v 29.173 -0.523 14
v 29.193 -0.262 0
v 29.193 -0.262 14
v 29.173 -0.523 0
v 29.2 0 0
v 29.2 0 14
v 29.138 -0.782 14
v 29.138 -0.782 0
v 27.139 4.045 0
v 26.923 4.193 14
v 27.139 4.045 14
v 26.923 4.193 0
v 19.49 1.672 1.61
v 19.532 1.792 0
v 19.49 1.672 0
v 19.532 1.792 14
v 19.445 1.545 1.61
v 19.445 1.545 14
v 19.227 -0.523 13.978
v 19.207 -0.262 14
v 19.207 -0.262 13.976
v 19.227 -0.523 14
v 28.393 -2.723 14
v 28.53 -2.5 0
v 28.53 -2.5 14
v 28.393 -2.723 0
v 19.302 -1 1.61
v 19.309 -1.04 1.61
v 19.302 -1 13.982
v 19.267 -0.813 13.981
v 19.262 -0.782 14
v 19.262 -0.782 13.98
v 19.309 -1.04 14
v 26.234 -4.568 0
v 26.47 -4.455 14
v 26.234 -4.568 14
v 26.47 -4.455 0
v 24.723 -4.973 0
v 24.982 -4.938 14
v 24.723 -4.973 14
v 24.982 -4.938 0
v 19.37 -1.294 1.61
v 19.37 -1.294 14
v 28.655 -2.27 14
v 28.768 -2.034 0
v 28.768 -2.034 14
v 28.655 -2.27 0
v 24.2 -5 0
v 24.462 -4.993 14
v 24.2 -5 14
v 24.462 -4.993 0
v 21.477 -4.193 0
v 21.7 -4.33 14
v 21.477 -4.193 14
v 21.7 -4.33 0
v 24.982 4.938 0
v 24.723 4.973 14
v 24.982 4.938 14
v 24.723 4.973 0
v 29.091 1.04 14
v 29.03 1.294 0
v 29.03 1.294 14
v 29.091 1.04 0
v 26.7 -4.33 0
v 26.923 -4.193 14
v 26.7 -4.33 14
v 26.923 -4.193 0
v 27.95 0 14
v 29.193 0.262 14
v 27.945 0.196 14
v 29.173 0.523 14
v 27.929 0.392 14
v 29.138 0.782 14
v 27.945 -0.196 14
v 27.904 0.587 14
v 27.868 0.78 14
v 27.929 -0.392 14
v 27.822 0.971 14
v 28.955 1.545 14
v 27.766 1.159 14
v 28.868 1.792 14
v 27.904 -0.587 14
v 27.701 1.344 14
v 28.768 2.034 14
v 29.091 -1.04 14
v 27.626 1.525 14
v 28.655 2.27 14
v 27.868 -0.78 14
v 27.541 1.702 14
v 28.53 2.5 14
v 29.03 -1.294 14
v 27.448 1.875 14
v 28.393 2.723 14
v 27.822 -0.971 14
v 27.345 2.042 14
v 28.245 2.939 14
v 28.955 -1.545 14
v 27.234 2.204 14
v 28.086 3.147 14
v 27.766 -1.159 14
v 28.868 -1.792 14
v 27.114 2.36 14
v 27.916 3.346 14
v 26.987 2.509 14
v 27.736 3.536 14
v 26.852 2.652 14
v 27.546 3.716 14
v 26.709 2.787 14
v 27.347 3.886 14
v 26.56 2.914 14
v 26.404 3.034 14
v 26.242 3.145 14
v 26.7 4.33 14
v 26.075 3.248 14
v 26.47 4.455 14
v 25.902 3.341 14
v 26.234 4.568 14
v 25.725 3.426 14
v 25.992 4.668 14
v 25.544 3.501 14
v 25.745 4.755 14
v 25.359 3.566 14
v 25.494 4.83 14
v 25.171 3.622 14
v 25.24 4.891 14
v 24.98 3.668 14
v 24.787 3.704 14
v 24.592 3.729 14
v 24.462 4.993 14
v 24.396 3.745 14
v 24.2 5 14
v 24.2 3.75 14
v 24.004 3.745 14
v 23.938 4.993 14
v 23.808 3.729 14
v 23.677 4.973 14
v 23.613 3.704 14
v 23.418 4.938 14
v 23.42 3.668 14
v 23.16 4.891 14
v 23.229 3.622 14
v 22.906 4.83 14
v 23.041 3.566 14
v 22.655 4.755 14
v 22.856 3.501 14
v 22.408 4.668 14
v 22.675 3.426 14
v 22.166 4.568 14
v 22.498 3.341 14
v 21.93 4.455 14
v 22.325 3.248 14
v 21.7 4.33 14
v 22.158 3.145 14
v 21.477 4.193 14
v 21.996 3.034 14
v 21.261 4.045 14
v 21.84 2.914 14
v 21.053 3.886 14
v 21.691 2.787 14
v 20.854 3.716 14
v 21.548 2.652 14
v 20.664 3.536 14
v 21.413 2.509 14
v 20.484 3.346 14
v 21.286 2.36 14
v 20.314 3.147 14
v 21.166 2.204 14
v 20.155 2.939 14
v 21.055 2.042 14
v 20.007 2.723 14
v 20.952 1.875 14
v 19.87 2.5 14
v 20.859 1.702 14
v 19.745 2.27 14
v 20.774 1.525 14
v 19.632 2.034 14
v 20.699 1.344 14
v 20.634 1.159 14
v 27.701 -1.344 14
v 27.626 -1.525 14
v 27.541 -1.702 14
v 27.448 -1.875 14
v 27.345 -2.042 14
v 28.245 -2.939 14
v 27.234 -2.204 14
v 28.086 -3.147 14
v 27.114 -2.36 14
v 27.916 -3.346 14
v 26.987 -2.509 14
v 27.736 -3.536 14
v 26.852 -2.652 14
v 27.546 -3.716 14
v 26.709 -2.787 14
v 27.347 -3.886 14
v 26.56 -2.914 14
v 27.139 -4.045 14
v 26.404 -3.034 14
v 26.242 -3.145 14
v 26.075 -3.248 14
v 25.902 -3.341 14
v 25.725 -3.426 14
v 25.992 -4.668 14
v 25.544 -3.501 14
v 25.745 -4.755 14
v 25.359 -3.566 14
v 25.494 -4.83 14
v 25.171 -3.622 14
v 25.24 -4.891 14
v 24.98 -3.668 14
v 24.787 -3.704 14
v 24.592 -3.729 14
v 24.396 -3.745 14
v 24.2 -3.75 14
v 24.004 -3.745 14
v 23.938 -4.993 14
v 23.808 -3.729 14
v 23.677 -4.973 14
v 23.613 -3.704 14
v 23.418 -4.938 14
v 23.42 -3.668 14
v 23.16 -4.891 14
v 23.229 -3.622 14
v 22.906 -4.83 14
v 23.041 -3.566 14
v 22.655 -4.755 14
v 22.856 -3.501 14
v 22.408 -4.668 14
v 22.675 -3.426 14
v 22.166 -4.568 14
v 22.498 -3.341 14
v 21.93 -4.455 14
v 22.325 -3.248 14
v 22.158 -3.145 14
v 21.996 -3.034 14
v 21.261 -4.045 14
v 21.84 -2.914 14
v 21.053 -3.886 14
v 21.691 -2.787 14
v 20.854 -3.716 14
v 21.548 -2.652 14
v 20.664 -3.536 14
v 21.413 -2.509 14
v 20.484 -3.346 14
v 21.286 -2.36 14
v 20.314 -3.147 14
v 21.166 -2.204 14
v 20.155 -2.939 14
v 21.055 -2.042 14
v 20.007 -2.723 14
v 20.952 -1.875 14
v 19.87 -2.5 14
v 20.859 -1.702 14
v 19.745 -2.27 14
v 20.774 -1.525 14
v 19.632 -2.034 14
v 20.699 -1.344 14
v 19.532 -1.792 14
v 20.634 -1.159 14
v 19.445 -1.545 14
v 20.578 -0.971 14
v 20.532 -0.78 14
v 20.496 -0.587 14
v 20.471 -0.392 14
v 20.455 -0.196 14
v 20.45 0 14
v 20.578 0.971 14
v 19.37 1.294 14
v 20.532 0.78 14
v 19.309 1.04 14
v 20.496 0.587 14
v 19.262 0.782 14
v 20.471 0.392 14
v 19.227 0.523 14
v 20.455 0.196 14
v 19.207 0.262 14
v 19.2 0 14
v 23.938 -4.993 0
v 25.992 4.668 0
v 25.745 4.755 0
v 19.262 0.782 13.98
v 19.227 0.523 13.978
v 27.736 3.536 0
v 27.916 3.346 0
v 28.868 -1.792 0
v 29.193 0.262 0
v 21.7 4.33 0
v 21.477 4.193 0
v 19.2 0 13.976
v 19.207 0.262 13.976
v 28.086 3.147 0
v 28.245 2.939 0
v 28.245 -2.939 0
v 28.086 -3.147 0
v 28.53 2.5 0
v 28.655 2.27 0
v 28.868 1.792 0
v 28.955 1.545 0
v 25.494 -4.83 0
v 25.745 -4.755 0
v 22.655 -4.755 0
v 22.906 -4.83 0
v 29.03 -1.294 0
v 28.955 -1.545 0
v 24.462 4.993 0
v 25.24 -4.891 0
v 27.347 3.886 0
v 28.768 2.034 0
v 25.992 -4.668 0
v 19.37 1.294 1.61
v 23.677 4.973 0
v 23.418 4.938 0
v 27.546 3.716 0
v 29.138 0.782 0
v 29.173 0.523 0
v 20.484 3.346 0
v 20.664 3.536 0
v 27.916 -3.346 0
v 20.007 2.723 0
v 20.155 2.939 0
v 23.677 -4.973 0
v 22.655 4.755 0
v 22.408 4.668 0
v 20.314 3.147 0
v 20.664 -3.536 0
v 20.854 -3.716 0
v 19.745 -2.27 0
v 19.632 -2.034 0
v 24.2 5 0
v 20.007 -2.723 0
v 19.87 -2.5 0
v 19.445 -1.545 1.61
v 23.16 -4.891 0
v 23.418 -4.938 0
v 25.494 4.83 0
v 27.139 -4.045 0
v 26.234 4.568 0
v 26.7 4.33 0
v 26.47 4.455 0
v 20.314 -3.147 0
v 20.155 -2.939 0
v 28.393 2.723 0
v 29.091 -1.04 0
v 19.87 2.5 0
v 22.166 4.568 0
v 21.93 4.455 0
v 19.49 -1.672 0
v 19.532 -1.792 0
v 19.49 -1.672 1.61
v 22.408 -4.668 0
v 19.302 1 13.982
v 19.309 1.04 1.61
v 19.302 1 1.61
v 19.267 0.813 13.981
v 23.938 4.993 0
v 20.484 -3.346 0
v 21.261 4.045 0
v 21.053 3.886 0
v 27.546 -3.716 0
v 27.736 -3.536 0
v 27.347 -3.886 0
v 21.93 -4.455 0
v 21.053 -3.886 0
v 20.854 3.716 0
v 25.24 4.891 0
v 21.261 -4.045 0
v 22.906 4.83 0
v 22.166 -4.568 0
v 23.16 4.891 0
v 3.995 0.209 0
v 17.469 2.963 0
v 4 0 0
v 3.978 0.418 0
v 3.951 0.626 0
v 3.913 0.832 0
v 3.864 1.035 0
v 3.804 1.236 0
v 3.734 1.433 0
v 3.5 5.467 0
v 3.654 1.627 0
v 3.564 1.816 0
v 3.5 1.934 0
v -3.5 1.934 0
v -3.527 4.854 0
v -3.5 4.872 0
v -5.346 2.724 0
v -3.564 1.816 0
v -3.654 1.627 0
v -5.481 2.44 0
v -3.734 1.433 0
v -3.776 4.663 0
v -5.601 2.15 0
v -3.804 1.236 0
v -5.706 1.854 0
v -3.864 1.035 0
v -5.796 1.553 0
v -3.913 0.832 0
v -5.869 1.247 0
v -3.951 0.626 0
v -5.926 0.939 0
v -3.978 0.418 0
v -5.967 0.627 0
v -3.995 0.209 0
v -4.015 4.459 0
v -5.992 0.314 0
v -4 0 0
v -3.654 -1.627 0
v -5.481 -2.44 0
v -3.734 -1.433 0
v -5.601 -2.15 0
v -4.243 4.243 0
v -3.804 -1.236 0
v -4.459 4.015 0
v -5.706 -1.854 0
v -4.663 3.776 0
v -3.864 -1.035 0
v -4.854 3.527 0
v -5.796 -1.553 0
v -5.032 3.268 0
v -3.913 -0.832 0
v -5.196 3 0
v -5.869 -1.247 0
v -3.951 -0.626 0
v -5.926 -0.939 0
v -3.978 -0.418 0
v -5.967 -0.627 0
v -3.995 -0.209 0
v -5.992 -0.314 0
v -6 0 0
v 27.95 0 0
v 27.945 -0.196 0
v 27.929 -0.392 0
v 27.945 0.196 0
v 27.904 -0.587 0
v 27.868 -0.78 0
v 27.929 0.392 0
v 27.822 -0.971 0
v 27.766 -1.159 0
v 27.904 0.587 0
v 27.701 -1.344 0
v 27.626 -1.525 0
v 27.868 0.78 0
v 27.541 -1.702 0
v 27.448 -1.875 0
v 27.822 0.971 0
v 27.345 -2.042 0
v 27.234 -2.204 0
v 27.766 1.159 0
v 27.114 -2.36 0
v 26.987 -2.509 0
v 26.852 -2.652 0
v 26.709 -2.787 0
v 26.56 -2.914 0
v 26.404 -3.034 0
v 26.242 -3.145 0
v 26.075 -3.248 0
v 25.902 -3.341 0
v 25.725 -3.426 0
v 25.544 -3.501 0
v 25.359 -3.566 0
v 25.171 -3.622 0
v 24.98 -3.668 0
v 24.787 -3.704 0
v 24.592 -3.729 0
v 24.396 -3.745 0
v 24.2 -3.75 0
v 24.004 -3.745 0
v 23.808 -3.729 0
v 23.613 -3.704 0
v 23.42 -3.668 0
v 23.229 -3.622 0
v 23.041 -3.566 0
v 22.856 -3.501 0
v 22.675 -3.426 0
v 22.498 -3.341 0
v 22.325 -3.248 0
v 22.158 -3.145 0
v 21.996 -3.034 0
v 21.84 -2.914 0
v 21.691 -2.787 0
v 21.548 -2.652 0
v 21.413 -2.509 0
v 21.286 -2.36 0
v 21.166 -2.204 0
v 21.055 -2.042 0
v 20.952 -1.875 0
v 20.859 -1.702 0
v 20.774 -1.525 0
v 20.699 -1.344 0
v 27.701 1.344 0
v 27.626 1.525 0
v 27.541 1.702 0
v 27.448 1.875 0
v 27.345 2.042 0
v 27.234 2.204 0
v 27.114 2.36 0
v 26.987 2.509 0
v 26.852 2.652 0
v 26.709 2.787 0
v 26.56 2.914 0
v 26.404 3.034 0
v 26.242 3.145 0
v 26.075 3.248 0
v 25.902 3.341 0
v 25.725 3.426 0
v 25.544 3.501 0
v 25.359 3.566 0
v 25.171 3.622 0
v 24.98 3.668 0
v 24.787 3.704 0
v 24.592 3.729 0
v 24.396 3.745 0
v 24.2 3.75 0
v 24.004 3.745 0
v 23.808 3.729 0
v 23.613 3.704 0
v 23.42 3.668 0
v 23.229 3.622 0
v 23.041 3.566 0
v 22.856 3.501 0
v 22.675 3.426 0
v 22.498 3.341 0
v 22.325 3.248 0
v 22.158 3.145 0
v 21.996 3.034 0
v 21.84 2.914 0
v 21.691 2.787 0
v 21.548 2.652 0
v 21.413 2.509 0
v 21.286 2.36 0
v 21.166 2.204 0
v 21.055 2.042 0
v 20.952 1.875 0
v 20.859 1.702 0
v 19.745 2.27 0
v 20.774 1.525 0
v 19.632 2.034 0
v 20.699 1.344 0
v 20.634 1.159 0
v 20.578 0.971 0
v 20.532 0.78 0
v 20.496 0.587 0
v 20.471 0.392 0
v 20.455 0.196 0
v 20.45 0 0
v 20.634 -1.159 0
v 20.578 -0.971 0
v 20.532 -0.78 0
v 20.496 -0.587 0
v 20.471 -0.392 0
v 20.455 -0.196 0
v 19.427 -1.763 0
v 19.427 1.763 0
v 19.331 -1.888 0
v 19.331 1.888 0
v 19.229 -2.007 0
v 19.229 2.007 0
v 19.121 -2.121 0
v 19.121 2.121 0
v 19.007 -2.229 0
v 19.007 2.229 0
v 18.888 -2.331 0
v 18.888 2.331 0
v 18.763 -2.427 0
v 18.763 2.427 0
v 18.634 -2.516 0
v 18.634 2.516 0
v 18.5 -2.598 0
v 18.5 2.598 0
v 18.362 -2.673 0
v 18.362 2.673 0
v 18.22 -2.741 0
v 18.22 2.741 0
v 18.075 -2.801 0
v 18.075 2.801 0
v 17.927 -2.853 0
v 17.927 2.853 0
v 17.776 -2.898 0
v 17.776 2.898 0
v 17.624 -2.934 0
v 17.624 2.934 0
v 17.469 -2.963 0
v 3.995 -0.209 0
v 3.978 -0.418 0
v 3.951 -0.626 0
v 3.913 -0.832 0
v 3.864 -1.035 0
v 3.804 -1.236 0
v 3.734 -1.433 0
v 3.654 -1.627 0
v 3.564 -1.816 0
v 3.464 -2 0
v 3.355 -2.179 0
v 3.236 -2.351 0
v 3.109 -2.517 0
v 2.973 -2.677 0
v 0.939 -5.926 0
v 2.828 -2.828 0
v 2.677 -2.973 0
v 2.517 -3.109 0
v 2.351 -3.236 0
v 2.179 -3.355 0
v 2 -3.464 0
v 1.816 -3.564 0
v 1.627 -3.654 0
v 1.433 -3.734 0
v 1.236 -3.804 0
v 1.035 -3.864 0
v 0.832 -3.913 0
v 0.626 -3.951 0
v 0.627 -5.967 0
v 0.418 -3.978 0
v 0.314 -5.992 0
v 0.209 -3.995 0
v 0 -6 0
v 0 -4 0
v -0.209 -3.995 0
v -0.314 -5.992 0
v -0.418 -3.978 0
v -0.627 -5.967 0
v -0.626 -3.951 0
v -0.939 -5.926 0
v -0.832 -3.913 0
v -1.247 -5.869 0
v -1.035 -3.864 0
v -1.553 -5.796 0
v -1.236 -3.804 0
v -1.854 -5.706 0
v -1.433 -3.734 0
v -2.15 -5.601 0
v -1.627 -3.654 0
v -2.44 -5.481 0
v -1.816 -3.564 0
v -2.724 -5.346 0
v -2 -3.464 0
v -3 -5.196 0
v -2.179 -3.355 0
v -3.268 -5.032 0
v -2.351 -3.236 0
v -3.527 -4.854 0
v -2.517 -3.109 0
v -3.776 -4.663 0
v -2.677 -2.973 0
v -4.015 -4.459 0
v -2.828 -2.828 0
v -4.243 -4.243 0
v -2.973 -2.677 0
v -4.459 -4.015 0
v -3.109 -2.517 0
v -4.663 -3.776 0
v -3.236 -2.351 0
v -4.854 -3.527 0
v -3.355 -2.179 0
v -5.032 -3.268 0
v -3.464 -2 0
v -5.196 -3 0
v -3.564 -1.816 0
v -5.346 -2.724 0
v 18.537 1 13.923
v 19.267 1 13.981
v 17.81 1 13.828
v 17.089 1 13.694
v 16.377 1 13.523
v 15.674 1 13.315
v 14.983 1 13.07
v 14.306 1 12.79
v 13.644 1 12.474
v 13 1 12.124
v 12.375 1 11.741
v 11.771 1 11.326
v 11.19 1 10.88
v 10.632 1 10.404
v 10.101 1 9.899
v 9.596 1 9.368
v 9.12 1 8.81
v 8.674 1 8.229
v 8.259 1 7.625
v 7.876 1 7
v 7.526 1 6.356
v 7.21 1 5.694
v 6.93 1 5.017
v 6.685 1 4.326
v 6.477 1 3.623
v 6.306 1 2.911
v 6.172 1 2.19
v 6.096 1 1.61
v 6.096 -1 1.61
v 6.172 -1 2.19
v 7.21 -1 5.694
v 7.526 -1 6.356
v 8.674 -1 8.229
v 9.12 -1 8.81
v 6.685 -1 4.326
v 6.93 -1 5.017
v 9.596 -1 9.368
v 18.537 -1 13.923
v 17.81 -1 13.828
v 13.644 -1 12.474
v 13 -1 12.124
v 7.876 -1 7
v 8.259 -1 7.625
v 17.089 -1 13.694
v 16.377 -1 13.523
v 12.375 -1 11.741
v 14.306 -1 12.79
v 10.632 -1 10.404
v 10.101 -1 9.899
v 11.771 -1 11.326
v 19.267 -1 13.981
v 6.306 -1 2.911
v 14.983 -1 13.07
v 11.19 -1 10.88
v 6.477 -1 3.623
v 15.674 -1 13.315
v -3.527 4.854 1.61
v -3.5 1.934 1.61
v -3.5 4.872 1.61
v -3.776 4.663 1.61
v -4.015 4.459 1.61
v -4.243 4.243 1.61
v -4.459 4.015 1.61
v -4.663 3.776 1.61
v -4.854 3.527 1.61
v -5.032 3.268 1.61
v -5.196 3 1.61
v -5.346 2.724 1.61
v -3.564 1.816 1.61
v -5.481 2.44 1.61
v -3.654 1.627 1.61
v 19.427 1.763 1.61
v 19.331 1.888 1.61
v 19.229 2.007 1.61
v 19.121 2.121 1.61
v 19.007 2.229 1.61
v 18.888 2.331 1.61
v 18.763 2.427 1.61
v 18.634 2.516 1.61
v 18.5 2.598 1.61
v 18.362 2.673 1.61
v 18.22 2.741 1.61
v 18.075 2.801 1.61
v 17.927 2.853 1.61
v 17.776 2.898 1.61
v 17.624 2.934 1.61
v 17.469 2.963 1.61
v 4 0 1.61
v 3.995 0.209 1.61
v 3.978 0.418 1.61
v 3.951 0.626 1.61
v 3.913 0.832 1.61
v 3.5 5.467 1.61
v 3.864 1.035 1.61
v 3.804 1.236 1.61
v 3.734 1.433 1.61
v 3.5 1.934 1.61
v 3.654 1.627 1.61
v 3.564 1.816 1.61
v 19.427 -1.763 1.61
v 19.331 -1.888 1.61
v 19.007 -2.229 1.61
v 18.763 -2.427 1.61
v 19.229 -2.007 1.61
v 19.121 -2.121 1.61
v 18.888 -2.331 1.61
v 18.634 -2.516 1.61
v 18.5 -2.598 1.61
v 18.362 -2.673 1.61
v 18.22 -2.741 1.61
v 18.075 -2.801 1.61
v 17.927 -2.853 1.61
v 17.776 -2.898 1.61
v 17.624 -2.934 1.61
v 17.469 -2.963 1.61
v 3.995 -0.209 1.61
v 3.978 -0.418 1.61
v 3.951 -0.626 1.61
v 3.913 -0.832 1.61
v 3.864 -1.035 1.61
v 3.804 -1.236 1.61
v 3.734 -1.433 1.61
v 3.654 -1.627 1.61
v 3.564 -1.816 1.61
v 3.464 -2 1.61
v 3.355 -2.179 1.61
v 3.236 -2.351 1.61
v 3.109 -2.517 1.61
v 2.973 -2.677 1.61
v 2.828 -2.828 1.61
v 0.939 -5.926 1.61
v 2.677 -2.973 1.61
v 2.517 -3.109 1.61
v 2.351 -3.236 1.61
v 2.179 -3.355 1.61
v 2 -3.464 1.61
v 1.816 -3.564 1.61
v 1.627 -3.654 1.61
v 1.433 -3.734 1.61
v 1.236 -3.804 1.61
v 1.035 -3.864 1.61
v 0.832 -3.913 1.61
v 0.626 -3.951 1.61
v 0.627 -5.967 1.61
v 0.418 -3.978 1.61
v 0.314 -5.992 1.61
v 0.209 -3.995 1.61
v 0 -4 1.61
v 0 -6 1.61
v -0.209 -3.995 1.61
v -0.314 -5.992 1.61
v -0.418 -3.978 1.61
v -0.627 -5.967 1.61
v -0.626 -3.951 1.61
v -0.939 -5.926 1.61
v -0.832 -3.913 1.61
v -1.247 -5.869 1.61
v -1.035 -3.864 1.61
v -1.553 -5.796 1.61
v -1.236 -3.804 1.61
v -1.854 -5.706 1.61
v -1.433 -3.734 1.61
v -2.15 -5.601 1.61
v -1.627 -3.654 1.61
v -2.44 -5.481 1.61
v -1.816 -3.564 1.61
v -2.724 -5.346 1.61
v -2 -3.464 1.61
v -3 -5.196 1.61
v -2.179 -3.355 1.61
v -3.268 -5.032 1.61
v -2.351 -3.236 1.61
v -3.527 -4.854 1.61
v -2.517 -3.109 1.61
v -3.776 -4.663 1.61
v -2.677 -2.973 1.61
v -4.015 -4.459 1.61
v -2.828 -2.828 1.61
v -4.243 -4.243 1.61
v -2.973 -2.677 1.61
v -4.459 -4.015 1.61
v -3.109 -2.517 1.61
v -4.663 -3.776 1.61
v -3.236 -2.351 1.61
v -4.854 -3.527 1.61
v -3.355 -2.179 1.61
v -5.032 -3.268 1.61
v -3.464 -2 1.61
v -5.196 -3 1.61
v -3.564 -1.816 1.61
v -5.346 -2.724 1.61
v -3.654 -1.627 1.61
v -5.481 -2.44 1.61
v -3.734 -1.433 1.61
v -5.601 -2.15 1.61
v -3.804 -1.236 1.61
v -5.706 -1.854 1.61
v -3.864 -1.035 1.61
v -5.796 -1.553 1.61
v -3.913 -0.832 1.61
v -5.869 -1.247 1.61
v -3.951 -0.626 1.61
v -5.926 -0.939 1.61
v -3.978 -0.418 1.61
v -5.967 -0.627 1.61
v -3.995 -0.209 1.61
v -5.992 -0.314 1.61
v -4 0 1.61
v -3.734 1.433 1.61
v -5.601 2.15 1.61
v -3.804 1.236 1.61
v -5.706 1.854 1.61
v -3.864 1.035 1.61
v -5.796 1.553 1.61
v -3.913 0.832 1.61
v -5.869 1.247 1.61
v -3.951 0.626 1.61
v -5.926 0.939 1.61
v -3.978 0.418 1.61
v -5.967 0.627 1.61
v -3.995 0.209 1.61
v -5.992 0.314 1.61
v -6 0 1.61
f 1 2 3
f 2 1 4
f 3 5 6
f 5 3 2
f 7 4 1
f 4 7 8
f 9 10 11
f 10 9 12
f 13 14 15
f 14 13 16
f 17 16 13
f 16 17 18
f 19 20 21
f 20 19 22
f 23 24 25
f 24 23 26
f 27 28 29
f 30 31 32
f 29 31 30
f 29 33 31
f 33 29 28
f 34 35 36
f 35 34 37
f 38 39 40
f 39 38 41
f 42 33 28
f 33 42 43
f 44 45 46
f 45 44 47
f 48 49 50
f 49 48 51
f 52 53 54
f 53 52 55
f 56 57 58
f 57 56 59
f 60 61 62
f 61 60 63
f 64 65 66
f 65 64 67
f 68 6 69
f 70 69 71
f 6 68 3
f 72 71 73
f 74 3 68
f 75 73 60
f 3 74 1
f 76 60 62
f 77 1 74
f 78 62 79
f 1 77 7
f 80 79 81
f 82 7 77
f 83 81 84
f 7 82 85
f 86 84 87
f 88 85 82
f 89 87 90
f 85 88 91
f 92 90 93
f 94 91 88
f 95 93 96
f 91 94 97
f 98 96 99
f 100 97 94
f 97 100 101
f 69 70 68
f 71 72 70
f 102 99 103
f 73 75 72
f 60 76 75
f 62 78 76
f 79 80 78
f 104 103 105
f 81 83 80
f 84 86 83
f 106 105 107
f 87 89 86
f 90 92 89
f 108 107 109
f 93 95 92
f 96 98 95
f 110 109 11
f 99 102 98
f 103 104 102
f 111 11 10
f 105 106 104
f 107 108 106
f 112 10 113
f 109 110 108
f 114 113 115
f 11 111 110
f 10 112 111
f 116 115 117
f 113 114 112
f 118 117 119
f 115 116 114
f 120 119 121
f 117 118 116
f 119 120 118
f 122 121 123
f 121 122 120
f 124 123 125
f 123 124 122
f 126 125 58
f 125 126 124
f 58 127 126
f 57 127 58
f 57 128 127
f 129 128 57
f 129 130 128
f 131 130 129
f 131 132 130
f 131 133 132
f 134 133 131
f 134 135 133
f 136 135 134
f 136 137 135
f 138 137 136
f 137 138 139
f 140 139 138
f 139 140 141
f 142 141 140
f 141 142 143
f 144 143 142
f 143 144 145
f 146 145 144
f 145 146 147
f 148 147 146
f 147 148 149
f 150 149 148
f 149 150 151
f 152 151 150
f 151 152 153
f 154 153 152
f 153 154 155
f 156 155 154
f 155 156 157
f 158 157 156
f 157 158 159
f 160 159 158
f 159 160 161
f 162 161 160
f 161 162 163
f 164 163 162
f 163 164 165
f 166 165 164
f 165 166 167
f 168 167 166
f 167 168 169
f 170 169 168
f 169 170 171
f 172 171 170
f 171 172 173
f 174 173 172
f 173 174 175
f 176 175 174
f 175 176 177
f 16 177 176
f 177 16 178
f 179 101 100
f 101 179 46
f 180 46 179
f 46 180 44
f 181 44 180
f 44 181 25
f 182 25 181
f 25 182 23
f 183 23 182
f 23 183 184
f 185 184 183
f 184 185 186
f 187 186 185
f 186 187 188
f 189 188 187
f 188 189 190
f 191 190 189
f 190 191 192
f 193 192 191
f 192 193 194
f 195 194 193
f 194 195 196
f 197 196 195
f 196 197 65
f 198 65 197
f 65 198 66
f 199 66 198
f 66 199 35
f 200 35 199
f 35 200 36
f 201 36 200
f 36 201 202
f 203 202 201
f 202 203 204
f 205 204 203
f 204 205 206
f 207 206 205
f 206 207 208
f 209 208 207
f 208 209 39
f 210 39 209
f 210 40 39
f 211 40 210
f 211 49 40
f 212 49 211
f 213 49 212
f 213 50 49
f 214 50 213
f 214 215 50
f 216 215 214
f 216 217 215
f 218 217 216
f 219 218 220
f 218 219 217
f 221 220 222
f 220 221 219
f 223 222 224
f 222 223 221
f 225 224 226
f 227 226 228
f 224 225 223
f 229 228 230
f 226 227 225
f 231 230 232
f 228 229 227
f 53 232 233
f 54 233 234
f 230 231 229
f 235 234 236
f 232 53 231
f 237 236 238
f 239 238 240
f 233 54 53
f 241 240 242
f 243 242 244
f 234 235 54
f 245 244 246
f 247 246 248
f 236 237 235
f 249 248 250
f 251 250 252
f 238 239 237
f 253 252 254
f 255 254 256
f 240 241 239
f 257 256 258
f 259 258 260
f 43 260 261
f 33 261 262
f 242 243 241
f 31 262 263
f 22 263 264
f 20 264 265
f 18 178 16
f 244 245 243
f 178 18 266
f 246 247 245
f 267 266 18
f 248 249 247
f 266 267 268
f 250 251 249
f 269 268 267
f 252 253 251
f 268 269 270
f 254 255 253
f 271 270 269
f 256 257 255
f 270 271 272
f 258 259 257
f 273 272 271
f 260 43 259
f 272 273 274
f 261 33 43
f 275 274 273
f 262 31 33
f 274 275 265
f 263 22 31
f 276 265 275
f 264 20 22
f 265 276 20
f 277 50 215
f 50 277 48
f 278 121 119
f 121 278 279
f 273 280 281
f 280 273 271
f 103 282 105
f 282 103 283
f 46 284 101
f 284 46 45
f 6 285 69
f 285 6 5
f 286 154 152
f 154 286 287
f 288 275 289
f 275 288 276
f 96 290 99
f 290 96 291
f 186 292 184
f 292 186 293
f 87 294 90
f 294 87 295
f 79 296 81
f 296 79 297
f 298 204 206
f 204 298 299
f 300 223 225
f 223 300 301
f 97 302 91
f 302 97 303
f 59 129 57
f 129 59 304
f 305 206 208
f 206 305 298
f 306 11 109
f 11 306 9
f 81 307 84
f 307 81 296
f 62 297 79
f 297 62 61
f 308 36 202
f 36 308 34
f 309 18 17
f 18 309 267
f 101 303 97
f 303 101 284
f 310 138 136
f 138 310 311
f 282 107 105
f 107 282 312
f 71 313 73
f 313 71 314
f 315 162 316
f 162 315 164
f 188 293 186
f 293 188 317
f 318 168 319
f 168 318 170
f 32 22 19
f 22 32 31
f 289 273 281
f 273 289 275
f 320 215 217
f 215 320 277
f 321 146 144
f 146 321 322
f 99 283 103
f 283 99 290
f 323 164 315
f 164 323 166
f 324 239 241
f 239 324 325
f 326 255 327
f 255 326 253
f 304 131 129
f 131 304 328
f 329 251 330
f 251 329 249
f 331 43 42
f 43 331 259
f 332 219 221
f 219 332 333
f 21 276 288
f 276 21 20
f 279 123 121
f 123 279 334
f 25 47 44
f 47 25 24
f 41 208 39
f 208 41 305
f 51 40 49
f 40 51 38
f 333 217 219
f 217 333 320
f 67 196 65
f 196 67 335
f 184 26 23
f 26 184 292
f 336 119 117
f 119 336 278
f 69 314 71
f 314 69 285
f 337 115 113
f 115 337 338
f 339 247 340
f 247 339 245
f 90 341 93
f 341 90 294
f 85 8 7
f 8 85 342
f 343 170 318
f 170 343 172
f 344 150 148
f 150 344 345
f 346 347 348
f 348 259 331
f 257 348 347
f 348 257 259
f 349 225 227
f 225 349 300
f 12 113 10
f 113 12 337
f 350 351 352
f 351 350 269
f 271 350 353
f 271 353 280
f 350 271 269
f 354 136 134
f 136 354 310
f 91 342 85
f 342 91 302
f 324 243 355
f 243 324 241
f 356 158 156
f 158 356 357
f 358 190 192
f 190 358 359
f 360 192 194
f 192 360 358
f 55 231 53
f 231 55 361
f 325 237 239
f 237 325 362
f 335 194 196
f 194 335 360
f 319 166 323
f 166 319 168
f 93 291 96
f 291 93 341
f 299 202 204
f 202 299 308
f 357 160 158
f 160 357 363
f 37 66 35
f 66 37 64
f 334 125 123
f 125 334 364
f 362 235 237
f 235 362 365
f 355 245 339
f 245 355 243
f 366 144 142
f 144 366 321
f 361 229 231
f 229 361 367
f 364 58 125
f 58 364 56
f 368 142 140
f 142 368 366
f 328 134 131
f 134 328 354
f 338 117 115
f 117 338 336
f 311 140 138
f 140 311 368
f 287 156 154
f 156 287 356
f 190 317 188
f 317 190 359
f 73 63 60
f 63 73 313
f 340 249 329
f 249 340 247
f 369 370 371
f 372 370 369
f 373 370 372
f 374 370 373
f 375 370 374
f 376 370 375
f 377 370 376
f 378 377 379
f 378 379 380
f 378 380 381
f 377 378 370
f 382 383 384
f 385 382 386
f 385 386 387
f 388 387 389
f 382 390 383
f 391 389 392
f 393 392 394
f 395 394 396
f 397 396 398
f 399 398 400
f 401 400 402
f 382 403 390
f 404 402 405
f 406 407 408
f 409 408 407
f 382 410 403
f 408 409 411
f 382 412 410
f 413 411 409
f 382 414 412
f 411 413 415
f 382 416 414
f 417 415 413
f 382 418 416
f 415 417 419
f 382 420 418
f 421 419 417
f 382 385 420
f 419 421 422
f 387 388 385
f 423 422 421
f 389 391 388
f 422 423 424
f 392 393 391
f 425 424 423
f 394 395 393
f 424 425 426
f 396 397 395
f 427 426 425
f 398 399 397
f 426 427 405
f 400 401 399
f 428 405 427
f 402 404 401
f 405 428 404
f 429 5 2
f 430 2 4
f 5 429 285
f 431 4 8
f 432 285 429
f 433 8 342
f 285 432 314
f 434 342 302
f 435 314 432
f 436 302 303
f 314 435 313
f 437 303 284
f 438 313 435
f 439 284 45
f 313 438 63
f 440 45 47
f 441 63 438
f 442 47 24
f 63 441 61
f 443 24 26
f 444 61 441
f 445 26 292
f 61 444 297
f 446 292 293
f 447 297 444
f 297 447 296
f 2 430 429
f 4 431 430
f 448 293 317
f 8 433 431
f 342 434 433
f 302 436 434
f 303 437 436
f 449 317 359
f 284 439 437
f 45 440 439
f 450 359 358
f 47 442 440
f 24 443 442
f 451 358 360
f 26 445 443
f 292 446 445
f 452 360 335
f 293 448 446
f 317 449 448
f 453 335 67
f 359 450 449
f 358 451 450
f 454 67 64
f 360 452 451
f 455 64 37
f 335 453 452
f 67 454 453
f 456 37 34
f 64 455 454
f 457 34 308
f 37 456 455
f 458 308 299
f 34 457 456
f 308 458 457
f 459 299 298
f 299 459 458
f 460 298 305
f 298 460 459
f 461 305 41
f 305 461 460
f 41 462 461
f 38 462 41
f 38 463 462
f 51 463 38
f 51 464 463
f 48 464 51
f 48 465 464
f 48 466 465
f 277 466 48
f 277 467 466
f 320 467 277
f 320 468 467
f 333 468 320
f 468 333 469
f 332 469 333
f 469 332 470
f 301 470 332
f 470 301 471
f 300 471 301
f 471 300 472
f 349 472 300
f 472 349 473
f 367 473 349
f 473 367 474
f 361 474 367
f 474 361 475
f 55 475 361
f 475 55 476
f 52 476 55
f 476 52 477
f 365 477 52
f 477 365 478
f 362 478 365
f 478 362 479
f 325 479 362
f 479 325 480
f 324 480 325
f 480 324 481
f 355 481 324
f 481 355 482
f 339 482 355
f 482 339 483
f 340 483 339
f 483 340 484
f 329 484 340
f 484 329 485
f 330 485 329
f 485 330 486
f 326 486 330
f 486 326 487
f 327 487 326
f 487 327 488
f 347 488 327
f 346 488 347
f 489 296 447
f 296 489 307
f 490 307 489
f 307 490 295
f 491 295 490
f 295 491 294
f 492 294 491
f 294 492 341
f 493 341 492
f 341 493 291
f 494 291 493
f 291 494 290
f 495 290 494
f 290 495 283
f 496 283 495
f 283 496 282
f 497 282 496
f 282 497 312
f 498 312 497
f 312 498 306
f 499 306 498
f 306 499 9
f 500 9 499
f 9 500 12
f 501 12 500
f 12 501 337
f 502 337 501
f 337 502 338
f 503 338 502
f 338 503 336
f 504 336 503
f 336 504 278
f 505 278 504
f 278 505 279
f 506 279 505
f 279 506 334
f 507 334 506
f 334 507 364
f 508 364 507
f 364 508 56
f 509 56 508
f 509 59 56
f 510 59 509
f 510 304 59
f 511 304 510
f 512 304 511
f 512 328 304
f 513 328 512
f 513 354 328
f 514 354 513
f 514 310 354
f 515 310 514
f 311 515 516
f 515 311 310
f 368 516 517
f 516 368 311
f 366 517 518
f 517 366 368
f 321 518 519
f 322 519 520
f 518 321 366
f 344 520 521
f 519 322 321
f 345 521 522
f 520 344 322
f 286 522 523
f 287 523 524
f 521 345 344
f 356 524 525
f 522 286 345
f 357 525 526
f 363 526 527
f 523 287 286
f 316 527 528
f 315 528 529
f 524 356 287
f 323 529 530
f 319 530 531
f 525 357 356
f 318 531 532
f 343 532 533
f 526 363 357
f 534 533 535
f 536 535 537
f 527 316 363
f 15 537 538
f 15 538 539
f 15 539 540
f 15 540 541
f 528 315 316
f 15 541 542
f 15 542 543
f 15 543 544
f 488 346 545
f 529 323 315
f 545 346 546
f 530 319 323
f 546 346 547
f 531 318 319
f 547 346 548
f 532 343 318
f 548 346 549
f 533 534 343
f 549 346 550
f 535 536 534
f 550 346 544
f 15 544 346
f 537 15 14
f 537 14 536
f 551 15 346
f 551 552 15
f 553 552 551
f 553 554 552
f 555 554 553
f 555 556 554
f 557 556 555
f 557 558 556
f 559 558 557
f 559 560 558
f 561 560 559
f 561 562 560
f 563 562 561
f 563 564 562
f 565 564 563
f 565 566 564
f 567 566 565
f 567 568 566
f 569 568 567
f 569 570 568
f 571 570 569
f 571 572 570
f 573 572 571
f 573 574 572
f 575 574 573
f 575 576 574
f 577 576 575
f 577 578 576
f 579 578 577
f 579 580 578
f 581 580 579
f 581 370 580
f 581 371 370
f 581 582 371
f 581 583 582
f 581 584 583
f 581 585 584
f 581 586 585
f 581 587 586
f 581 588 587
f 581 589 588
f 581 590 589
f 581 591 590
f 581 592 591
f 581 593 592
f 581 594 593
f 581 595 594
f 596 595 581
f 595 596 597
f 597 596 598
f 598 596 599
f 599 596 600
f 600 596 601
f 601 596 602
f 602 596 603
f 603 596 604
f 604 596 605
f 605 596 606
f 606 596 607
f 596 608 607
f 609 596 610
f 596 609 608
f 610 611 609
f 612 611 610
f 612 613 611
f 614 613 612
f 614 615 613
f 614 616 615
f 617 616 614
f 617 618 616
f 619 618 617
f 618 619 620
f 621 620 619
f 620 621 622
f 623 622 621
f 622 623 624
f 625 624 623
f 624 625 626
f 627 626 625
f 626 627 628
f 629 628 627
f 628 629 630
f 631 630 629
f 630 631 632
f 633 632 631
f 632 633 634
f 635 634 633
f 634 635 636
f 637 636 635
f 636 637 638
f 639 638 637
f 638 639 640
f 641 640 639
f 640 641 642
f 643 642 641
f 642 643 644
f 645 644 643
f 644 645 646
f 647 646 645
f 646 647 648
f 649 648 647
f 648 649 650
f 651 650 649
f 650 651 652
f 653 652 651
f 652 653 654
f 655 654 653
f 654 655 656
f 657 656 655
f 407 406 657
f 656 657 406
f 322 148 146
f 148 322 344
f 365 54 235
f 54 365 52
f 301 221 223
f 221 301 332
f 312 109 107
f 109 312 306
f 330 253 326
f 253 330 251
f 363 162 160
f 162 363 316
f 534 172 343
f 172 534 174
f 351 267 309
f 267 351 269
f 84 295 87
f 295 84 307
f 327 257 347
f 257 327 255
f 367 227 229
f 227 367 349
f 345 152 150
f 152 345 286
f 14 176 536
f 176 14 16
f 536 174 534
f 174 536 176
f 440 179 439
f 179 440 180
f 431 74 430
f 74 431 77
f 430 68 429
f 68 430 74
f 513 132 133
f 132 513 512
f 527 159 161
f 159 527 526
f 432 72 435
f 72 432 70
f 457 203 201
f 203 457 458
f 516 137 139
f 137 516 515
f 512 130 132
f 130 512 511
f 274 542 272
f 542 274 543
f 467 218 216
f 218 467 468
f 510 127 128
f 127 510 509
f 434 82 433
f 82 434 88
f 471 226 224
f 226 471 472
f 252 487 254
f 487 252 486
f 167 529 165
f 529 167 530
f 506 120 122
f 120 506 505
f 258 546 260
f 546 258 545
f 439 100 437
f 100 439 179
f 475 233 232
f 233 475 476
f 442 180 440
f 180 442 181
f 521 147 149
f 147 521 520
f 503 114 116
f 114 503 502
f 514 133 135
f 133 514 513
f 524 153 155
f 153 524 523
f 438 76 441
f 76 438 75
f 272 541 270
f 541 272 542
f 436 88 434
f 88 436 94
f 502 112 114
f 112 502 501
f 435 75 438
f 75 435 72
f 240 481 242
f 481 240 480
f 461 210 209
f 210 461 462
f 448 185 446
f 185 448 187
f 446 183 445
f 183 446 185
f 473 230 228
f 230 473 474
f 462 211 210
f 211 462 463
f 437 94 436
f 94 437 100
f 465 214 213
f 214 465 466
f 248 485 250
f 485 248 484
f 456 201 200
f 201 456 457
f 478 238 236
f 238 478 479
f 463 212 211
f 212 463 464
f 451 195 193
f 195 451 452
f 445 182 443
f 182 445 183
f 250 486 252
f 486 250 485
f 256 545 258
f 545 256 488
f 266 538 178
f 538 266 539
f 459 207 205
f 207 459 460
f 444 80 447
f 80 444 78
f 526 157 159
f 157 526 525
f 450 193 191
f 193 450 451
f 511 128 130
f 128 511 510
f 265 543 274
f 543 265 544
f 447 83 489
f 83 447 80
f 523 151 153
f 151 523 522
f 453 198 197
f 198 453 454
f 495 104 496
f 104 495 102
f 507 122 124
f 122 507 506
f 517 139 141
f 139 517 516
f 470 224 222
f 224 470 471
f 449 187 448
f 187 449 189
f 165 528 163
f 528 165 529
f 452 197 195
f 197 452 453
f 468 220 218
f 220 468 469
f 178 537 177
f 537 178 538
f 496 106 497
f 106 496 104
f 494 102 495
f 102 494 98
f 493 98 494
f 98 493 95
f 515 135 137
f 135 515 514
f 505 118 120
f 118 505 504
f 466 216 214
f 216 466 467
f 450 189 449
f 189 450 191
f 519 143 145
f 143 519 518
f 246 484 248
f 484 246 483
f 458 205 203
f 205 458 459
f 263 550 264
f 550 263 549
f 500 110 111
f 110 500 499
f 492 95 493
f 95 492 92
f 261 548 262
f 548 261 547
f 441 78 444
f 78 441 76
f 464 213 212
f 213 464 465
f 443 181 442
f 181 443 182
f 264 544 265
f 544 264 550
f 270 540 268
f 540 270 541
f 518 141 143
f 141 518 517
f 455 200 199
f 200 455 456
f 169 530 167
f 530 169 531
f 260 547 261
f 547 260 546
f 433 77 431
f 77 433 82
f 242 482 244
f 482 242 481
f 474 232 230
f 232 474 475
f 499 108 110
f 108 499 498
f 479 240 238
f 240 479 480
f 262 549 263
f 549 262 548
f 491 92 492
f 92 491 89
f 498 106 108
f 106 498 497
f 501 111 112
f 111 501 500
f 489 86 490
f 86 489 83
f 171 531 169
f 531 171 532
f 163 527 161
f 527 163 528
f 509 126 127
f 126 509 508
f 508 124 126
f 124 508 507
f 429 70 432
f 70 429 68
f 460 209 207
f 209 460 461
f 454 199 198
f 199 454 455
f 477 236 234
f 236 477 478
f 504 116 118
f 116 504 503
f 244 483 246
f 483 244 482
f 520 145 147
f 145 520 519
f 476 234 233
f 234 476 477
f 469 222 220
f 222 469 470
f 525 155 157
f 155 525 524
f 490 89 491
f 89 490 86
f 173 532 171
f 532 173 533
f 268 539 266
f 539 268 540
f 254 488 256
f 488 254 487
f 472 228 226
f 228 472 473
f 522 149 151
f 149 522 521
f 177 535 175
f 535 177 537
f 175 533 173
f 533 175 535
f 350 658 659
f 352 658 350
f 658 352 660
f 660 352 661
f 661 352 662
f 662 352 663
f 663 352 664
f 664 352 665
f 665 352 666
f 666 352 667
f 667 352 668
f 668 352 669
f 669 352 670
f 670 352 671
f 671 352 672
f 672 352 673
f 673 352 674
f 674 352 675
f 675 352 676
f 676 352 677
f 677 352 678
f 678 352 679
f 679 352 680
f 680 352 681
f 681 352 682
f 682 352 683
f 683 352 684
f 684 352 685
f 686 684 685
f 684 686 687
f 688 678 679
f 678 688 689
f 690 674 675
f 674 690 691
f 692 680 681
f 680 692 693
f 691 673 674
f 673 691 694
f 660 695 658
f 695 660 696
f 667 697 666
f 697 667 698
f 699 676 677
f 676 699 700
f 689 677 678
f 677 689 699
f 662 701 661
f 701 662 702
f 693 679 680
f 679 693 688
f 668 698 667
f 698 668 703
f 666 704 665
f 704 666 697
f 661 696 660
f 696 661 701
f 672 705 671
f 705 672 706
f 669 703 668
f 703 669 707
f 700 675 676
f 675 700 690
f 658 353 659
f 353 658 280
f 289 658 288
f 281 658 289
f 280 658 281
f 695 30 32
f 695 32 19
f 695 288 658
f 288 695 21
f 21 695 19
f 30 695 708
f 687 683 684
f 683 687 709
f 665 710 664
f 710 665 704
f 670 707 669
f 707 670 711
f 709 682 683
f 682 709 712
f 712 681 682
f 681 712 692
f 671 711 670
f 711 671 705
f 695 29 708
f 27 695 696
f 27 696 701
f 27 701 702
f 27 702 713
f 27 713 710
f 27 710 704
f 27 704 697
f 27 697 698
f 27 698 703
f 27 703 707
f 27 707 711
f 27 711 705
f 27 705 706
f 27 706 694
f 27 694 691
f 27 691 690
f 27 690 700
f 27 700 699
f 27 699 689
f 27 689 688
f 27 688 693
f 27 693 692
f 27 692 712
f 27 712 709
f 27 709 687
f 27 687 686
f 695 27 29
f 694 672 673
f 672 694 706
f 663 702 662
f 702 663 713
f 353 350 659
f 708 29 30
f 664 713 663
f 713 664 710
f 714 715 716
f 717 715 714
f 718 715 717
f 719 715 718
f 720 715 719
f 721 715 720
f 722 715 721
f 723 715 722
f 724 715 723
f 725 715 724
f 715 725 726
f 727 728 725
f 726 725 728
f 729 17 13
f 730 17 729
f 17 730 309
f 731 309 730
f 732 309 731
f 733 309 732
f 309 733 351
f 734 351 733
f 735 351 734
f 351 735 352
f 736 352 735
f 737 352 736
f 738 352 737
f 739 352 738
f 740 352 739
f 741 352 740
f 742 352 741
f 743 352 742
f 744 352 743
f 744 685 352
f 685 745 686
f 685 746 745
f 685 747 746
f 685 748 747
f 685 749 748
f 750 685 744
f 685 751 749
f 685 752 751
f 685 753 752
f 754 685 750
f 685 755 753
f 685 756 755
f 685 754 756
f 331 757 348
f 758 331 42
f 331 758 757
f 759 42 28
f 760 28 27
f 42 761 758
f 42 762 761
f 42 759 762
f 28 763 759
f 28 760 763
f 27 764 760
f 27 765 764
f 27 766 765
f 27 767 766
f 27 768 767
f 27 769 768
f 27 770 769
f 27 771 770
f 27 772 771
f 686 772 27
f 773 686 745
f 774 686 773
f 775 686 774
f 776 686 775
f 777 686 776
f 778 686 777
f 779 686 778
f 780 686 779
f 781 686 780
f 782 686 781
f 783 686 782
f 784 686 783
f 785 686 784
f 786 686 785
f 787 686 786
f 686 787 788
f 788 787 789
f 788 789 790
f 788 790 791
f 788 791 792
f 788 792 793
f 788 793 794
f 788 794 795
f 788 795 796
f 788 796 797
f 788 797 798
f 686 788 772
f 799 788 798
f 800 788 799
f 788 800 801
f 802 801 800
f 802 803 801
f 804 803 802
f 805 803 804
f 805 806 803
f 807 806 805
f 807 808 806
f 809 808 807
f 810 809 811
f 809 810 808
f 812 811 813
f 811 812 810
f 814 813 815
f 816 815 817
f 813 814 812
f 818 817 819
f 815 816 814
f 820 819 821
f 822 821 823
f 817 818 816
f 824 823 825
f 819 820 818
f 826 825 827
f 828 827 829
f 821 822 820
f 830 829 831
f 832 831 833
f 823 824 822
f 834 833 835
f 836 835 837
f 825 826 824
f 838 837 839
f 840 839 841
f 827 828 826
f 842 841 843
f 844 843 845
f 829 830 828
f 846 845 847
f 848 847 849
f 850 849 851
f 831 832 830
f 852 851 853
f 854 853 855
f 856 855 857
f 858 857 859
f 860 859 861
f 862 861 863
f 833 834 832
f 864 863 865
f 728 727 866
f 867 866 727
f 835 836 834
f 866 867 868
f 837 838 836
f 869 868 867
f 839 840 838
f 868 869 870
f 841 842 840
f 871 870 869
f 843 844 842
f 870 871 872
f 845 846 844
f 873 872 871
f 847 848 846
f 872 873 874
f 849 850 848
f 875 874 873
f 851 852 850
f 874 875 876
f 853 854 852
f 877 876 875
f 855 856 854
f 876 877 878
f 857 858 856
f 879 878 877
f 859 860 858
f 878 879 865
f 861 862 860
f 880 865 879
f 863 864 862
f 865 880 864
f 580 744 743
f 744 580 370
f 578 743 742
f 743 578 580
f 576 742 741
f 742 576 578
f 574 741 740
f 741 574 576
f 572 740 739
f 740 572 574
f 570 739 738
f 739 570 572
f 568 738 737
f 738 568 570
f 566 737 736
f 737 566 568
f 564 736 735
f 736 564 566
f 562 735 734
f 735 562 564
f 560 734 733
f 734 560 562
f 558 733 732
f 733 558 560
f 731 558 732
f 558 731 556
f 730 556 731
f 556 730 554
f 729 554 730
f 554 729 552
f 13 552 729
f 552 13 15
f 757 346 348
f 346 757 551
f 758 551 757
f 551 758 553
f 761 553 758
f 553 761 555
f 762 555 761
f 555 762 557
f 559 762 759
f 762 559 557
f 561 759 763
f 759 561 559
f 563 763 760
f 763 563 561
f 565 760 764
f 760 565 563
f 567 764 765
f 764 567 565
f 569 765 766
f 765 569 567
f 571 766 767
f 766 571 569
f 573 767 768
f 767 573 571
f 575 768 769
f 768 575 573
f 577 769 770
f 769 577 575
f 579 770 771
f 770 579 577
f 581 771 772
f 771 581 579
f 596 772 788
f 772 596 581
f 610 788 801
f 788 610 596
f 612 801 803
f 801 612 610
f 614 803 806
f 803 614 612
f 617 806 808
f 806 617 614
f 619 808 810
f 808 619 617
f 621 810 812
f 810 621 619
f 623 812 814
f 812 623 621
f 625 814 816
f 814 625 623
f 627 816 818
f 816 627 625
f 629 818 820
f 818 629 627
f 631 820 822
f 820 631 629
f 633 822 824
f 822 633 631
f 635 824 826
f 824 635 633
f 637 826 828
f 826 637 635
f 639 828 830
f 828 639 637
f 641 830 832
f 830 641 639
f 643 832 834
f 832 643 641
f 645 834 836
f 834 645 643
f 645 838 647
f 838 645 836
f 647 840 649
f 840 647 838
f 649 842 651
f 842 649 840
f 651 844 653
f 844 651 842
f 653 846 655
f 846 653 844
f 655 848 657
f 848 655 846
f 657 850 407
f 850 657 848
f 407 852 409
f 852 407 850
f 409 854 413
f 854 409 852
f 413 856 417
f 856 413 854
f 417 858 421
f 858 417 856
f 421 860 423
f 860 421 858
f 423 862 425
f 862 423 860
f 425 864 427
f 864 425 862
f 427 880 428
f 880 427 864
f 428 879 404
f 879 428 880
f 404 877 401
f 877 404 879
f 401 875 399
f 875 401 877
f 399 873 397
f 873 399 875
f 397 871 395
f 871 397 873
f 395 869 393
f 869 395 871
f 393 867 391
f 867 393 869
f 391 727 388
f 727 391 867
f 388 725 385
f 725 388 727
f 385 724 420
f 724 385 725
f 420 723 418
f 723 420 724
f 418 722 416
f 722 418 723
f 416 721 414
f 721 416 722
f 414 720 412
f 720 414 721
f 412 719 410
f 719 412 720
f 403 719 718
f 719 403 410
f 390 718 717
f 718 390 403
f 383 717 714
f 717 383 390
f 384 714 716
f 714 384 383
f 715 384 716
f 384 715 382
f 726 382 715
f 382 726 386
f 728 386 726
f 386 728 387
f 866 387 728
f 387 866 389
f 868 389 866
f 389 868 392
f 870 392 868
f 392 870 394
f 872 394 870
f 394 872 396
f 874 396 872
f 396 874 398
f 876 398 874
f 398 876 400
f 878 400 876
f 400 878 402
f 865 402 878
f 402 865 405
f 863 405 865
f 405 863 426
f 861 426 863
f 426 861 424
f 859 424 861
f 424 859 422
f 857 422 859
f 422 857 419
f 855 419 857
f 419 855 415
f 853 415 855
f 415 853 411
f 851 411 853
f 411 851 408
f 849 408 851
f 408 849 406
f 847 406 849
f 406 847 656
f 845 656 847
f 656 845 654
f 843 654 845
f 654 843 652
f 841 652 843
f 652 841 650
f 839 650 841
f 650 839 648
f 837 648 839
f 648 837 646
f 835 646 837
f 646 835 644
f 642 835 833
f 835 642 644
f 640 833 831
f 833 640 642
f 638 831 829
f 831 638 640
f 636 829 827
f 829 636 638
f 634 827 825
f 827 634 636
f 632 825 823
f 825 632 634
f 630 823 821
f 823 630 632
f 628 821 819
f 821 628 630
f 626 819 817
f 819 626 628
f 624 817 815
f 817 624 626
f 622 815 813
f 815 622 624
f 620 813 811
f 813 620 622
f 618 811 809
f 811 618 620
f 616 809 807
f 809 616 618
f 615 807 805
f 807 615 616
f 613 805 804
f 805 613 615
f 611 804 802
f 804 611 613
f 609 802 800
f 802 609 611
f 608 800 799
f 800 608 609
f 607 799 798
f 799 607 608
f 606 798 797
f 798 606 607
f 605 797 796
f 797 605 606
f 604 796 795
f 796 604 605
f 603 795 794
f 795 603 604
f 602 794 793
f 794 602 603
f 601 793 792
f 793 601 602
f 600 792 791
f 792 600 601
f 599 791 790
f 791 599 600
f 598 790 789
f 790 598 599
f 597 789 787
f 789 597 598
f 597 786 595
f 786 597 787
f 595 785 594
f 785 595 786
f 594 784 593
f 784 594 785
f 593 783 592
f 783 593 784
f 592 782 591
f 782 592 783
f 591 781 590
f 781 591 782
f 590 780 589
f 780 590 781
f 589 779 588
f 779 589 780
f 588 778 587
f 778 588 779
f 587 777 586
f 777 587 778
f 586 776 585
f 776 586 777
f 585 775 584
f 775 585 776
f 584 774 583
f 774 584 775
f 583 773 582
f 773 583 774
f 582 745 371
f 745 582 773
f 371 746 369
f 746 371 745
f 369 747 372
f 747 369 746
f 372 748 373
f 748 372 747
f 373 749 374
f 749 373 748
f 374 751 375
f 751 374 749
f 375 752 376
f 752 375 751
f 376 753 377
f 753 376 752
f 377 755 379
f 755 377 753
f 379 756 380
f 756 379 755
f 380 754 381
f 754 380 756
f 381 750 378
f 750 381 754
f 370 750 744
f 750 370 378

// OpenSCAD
thickness=1.61;
mirror=1; // [1:Left tube, 0:Second tube]
/* [Hidden] */
$fn=120;

mirror([0,mirror,0]) {
linear_extrude(height=thickness){
difference(){
hull(){circle(d=12);
    translate([17,0]){
        circle(d=6);}
        ;}{
        circle(d=8);
        translate([0,-4]){
            square([7,8], center=true);};}
}}

//    linear_extrude(height=15){
    translate([24.2,0,0]){
        difference(){
            cylinder(d=10, h=14);translate([0,0,-1])
            cylinder(d=7.5, h=16);
        }
    }
    

translate([20,-1,0]){
rotate([90,0,180]){
intersection(){
    cube([14,14,3]);
    cylinder(d=28, h=2);
    
};}
}
}
